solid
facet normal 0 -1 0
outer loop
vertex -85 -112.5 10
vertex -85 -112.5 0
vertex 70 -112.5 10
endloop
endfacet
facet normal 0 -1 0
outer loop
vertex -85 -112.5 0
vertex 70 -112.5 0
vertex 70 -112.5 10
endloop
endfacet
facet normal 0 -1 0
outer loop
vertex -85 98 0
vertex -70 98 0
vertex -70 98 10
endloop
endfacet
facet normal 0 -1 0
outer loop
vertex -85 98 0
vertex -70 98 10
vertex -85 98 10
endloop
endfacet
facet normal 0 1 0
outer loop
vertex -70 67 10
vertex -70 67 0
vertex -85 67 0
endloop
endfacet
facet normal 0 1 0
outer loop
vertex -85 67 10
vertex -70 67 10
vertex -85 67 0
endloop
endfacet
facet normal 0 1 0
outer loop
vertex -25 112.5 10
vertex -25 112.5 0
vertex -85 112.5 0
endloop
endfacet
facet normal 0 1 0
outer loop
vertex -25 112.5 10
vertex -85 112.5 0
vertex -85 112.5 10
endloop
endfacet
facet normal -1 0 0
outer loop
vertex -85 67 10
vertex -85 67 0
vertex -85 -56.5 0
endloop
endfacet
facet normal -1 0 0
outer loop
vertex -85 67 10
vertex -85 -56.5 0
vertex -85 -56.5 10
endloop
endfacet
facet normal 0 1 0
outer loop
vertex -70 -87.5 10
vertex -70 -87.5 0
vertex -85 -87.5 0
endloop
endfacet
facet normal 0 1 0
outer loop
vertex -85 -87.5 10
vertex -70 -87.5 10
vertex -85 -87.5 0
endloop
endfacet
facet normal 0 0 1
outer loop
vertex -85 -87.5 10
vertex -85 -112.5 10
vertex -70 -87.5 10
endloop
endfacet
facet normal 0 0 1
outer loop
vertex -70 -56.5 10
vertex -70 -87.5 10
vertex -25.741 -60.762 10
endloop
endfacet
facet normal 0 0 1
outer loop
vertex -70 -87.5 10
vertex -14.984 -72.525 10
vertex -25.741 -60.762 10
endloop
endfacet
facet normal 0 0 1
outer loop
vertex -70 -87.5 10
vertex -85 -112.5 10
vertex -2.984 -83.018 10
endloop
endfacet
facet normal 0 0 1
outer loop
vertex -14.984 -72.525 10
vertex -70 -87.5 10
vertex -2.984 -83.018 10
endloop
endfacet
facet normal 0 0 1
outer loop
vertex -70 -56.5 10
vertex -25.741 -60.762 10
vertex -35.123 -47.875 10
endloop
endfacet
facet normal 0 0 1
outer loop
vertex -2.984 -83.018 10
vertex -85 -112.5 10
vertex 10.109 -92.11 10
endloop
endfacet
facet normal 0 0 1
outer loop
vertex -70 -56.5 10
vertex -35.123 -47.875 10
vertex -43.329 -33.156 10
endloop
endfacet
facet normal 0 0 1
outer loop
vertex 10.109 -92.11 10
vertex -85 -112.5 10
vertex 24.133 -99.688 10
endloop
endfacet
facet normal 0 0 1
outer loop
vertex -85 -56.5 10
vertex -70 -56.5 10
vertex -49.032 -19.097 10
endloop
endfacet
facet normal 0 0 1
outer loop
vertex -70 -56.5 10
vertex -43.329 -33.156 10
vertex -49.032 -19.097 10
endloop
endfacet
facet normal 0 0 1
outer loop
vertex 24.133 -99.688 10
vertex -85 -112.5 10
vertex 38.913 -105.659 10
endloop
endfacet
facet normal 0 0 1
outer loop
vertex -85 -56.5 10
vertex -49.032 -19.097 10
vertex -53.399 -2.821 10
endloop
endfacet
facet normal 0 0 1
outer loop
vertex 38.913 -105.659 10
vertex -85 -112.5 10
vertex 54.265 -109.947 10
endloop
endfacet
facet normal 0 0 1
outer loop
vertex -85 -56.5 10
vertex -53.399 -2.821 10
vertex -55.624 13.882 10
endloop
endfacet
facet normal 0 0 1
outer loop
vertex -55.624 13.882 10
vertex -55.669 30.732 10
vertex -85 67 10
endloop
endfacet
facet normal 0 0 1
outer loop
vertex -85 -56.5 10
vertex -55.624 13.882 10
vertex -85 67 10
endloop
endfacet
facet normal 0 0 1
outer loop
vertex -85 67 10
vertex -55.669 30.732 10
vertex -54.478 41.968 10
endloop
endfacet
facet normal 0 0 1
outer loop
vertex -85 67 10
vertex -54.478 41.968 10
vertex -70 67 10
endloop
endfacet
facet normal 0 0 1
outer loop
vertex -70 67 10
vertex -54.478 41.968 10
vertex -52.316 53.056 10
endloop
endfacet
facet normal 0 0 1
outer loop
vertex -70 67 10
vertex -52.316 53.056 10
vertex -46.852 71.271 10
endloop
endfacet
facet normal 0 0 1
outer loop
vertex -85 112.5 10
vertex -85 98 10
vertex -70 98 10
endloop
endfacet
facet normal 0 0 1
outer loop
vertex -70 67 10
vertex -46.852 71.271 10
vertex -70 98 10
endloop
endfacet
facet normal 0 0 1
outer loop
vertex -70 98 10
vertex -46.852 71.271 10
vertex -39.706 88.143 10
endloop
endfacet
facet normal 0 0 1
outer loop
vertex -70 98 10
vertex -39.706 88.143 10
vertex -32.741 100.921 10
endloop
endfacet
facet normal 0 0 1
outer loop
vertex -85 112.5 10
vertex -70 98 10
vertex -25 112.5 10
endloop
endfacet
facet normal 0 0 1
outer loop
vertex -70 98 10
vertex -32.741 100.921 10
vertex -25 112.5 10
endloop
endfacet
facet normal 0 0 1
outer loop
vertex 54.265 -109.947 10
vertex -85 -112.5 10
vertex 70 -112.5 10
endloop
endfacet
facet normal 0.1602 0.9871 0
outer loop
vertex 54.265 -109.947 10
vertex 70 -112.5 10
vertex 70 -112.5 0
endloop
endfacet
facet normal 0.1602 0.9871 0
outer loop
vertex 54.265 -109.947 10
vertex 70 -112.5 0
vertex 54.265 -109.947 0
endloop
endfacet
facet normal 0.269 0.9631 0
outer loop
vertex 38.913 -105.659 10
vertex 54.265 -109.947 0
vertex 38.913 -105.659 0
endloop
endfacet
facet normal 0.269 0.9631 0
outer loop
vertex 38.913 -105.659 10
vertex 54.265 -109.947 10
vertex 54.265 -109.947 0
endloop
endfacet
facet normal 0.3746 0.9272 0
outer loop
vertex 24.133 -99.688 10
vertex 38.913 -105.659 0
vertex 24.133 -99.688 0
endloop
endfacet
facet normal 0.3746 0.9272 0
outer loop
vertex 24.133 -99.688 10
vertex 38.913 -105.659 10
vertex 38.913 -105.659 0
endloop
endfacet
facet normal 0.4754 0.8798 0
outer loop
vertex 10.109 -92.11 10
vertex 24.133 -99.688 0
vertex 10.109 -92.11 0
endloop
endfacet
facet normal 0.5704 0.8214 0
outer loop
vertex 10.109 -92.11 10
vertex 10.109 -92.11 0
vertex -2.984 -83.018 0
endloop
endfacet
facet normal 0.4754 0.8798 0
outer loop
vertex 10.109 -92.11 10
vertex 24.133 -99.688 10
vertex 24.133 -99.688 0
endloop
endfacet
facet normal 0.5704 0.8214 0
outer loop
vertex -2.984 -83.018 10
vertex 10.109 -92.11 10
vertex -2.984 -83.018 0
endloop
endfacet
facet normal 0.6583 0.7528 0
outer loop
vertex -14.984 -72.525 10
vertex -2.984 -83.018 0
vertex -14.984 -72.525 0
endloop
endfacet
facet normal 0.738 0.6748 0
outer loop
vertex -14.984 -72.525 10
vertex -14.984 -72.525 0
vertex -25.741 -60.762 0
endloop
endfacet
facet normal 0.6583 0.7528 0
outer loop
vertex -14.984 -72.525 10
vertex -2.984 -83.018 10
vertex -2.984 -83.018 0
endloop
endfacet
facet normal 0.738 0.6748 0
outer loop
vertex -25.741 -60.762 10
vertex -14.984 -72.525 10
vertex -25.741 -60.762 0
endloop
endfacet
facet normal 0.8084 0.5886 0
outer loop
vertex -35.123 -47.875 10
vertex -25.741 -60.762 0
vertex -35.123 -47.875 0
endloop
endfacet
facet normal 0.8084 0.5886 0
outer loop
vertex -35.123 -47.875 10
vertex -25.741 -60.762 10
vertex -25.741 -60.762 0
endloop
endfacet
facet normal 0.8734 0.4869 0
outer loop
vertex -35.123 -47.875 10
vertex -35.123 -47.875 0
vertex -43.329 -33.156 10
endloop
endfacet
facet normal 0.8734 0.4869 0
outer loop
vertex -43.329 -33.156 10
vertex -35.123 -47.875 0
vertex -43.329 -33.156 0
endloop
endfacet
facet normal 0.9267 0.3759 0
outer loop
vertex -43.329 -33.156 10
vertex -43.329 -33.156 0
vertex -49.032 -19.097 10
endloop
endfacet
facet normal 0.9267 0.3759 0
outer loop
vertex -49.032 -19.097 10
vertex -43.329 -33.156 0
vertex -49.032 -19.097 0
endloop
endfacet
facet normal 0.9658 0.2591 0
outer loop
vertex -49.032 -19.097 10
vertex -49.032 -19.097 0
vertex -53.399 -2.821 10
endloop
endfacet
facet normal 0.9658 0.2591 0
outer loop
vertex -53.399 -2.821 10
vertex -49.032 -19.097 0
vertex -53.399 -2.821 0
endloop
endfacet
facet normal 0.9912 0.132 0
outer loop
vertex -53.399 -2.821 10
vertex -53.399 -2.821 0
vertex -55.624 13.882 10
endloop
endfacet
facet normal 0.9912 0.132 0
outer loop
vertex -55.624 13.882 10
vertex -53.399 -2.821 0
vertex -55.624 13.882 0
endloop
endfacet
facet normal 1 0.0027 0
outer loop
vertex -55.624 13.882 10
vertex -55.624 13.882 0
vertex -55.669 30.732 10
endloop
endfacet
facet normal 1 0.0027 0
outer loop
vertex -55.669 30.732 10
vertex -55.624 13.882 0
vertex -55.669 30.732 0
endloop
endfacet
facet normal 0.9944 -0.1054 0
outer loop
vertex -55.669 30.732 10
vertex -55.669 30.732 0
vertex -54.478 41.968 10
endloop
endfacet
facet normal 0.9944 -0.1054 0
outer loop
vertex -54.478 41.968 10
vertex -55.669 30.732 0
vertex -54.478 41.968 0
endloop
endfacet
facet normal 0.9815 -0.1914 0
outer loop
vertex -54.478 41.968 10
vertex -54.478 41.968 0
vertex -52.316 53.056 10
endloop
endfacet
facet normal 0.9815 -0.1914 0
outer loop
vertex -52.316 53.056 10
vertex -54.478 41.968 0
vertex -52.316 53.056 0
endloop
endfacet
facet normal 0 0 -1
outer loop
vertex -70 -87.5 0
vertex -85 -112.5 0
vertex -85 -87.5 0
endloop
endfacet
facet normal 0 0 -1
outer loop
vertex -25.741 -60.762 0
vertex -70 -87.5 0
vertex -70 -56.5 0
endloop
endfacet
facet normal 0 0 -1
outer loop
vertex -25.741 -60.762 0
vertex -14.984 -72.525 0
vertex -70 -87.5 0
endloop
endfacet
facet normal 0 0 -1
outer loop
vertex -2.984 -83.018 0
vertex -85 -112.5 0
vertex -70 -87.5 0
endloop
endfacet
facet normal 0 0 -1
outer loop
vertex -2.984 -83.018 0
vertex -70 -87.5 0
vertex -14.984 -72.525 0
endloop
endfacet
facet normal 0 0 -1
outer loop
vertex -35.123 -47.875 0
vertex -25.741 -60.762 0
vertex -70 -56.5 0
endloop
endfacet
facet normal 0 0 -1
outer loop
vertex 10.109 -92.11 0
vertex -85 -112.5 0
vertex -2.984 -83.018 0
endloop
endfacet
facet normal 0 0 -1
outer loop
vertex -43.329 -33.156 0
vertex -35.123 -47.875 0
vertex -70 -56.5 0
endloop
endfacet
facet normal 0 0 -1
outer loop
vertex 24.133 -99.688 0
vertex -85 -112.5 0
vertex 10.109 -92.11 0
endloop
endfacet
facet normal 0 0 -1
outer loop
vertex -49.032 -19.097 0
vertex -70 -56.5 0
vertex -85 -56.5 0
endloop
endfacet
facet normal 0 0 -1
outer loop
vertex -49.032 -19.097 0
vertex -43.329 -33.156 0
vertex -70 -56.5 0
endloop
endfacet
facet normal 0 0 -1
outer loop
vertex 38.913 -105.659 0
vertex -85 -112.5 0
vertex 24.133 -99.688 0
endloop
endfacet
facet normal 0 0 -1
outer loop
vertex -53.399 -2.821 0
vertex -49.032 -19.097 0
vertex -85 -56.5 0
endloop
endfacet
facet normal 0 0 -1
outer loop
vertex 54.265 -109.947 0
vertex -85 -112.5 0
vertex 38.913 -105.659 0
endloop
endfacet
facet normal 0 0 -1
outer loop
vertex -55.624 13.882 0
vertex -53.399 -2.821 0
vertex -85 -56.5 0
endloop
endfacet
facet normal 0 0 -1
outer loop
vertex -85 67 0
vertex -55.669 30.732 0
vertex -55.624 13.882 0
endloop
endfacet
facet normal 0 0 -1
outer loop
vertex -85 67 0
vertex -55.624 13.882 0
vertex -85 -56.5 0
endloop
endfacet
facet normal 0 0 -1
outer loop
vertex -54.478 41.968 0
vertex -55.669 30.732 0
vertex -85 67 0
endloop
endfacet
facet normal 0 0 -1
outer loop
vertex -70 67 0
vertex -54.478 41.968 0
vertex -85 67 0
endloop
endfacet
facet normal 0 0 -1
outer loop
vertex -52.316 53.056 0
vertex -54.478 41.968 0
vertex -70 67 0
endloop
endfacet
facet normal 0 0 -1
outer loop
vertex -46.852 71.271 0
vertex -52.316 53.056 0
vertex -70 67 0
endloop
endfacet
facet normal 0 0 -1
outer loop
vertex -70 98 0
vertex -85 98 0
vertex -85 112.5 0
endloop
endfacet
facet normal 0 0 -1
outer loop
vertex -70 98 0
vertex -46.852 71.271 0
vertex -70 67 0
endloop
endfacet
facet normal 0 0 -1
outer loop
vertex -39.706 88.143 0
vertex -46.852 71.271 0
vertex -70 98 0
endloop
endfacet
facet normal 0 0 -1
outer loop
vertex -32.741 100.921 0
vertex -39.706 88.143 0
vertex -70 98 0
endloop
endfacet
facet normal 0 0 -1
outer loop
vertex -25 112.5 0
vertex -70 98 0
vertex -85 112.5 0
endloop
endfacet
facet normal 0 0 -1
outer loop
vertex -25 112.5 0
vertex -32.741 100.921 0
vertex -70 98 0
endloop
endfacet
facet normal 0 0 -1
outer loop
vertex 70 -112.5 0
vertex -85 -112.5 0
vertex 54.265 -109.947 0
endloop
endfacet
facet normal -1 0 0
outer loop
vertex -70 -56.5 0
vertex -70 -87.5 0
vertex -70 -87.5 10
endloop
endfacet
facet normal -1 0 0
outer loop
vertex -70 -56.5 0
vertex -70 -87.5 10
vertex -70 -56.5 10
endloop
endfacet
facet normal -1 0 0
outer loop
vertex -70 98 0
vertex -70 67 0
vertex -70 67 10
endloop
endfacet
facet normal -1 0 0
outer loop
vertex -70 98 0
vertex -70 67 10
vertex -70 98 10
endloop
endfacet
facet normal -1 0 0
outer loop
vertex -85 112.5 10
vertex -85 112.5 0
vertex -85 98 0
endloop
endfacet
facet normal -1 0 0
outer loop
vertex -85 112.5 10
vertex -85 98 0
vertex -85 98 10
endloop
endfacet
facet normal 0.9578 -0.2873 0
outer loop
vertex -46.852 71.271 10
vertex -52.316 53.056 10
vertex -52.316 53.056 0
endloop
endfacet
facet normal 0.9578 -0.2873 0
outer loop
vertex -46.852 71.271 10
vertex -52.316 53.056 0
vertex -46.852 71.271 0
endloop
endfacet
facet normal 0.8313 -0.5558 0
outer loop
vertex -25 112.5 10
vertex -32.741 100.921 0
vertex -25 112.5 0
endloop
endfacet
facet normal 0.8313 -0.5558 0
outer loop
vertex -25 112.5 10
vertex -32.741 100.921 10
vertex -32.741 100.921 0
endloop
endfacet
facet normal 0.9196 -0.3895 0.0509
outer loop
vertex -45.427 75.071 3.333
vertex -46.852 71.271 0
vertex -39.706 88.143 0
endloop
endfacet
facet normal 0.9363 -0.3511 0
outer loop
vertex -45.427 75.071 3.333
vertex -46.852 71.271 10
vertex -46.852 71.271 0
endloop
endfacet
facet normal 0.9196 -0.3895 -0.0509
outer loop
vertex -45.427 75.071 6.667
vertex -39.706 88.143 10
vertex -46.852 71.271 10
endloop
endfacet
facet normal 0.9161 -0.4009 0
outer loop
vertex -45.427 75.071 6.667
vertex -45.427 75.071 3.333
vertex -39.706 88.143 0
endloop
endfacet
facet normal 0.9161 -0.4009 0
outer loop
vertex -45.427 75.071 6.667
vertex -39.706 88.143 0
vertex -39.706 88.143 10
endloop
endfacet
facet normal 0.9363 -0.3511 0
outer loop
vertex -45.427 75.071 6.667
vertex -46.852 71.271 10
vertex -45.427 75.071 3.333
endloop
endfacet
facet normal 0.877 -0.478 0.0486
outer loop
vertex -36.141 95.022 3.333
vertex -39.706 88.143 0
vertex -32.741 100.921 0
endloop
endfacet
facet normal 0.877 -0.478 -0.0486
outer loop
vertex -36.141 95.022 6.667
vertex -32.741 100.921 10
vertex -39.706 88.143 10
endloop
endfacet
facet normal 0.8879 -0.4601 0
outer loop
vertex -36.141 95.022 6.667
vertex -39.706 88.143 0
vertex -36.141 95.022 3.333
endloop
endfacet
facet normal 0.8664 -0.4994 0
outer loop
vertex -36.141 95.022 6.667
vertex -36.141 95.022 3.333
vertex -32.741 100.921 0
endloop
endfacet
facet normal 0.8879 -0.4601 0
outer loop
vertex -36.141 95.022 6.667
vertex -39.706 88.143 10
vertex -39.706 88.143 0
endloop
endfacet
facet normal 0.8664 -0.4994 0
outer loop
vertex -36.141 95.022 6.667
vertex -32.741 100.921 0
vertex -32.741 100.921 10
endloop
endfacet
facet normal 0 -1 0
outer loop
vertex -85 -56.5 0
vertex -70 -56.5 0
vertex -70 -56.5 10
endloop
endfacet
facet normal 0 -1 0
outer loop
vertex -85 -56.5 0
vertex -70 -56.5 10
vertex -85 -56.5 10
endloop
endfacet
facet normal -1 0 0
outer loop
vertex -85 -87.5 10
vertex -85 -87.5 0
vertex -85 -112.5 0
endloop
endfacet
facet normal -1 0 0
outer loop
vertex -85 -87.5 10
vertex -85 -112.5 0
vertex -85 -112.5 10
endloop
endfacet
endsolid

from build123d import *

# Parameters (mm, degrees)
SKETCH1_W           = 140
SKETCH1_H           = 225
BOSS_EXTRUDE1_DEPTH = 10
CUT_EXTRUDE1_DEPTH  = 10
FILLET1_R           = 130
SKETCH3_W           = 10
SKETCH3_H           = 225
BOSS_EXTRUDE2_DEPTH = 15
SKETCH4_W           = 15
SKETCH4_H           = 31
CUT_EXTRUDE3_DEPTH  = 142.355049579


with BuildPart() as part:
    # Sketch1 → Boss-Extrude1 (new body)
    with BuildSketch(Plane.XY):
        Rectangle(SKETCH1_W, SKETCH1_H)
    extrude(amount=BOSS_EXTRUDE1_DEPTH)

    # Sketch2 → Cut-Extrude1 (cut)
    with BuildSketch(Plane.XY.offset(10)):
        with BuildLine():
            Line((70, 112.5), (-25, 112.5))
            add(Edge.make_bspline(
                [(-57, 12.829167661), (-57.230920503, 51.908636371), (-43.499555568, 87.434937954), (-25, 112.5)],
                knots=[0, 0, 0, 0, 1, 1, 1, 1], degree=3))
            Line((-57, 12.829167661), (70, -112.5))
            Line((70, -112.5), (70, 112.5))
        make_face()
        with BuildLine():
            Line((-57, 12.829167661), (70, -112.5))
            ThreePointArc((70, -112.5), (-15.444512377, -72.072482958), (-57, 12.829167661))
        make_face()
    extrude(amount=-CUT_EXTRUDE1_DEPTH, mode=Mode.SUBTRACT)

    # Fillet1
    fillet1_edges = [part.edges().sort_by_distance(p)[0] for p in [
        (-57, 12.829167661, 5),
    ]]
    fillet(fillet1_edges, radius=FILLET1_R)

    # Sketch3 → Boss-Extrude2 (add)
    with BuildSketch(Plane.ZY.offset(70)):
        with Locations((5, 0)):
            Rectangle(SKETCH3_W, SKETCH3_H)
    extrude(amount=BOSS_EXTRUDE2_DEPTH)

    # Sketch4 → Cut-Extrude3 (cut, through all)
    with BuildSketch(Plane(origin=(0, 0, 0), x_dir=(-1, 0, 0), z_dir=(0, 0, -1))):
        with Locations((77.5, 82.5)):
            Rectangle(SKETCH4_W, SKETCH4_H)
        with Locations((77.5, -72)):
            Rectangle(SKETCH4_W, SKETCH4_H)
    extrude(amount=-CUT_EXTRUDE3_DEPTH, mode=Mode.SUBTRACT)


solid = part.part
